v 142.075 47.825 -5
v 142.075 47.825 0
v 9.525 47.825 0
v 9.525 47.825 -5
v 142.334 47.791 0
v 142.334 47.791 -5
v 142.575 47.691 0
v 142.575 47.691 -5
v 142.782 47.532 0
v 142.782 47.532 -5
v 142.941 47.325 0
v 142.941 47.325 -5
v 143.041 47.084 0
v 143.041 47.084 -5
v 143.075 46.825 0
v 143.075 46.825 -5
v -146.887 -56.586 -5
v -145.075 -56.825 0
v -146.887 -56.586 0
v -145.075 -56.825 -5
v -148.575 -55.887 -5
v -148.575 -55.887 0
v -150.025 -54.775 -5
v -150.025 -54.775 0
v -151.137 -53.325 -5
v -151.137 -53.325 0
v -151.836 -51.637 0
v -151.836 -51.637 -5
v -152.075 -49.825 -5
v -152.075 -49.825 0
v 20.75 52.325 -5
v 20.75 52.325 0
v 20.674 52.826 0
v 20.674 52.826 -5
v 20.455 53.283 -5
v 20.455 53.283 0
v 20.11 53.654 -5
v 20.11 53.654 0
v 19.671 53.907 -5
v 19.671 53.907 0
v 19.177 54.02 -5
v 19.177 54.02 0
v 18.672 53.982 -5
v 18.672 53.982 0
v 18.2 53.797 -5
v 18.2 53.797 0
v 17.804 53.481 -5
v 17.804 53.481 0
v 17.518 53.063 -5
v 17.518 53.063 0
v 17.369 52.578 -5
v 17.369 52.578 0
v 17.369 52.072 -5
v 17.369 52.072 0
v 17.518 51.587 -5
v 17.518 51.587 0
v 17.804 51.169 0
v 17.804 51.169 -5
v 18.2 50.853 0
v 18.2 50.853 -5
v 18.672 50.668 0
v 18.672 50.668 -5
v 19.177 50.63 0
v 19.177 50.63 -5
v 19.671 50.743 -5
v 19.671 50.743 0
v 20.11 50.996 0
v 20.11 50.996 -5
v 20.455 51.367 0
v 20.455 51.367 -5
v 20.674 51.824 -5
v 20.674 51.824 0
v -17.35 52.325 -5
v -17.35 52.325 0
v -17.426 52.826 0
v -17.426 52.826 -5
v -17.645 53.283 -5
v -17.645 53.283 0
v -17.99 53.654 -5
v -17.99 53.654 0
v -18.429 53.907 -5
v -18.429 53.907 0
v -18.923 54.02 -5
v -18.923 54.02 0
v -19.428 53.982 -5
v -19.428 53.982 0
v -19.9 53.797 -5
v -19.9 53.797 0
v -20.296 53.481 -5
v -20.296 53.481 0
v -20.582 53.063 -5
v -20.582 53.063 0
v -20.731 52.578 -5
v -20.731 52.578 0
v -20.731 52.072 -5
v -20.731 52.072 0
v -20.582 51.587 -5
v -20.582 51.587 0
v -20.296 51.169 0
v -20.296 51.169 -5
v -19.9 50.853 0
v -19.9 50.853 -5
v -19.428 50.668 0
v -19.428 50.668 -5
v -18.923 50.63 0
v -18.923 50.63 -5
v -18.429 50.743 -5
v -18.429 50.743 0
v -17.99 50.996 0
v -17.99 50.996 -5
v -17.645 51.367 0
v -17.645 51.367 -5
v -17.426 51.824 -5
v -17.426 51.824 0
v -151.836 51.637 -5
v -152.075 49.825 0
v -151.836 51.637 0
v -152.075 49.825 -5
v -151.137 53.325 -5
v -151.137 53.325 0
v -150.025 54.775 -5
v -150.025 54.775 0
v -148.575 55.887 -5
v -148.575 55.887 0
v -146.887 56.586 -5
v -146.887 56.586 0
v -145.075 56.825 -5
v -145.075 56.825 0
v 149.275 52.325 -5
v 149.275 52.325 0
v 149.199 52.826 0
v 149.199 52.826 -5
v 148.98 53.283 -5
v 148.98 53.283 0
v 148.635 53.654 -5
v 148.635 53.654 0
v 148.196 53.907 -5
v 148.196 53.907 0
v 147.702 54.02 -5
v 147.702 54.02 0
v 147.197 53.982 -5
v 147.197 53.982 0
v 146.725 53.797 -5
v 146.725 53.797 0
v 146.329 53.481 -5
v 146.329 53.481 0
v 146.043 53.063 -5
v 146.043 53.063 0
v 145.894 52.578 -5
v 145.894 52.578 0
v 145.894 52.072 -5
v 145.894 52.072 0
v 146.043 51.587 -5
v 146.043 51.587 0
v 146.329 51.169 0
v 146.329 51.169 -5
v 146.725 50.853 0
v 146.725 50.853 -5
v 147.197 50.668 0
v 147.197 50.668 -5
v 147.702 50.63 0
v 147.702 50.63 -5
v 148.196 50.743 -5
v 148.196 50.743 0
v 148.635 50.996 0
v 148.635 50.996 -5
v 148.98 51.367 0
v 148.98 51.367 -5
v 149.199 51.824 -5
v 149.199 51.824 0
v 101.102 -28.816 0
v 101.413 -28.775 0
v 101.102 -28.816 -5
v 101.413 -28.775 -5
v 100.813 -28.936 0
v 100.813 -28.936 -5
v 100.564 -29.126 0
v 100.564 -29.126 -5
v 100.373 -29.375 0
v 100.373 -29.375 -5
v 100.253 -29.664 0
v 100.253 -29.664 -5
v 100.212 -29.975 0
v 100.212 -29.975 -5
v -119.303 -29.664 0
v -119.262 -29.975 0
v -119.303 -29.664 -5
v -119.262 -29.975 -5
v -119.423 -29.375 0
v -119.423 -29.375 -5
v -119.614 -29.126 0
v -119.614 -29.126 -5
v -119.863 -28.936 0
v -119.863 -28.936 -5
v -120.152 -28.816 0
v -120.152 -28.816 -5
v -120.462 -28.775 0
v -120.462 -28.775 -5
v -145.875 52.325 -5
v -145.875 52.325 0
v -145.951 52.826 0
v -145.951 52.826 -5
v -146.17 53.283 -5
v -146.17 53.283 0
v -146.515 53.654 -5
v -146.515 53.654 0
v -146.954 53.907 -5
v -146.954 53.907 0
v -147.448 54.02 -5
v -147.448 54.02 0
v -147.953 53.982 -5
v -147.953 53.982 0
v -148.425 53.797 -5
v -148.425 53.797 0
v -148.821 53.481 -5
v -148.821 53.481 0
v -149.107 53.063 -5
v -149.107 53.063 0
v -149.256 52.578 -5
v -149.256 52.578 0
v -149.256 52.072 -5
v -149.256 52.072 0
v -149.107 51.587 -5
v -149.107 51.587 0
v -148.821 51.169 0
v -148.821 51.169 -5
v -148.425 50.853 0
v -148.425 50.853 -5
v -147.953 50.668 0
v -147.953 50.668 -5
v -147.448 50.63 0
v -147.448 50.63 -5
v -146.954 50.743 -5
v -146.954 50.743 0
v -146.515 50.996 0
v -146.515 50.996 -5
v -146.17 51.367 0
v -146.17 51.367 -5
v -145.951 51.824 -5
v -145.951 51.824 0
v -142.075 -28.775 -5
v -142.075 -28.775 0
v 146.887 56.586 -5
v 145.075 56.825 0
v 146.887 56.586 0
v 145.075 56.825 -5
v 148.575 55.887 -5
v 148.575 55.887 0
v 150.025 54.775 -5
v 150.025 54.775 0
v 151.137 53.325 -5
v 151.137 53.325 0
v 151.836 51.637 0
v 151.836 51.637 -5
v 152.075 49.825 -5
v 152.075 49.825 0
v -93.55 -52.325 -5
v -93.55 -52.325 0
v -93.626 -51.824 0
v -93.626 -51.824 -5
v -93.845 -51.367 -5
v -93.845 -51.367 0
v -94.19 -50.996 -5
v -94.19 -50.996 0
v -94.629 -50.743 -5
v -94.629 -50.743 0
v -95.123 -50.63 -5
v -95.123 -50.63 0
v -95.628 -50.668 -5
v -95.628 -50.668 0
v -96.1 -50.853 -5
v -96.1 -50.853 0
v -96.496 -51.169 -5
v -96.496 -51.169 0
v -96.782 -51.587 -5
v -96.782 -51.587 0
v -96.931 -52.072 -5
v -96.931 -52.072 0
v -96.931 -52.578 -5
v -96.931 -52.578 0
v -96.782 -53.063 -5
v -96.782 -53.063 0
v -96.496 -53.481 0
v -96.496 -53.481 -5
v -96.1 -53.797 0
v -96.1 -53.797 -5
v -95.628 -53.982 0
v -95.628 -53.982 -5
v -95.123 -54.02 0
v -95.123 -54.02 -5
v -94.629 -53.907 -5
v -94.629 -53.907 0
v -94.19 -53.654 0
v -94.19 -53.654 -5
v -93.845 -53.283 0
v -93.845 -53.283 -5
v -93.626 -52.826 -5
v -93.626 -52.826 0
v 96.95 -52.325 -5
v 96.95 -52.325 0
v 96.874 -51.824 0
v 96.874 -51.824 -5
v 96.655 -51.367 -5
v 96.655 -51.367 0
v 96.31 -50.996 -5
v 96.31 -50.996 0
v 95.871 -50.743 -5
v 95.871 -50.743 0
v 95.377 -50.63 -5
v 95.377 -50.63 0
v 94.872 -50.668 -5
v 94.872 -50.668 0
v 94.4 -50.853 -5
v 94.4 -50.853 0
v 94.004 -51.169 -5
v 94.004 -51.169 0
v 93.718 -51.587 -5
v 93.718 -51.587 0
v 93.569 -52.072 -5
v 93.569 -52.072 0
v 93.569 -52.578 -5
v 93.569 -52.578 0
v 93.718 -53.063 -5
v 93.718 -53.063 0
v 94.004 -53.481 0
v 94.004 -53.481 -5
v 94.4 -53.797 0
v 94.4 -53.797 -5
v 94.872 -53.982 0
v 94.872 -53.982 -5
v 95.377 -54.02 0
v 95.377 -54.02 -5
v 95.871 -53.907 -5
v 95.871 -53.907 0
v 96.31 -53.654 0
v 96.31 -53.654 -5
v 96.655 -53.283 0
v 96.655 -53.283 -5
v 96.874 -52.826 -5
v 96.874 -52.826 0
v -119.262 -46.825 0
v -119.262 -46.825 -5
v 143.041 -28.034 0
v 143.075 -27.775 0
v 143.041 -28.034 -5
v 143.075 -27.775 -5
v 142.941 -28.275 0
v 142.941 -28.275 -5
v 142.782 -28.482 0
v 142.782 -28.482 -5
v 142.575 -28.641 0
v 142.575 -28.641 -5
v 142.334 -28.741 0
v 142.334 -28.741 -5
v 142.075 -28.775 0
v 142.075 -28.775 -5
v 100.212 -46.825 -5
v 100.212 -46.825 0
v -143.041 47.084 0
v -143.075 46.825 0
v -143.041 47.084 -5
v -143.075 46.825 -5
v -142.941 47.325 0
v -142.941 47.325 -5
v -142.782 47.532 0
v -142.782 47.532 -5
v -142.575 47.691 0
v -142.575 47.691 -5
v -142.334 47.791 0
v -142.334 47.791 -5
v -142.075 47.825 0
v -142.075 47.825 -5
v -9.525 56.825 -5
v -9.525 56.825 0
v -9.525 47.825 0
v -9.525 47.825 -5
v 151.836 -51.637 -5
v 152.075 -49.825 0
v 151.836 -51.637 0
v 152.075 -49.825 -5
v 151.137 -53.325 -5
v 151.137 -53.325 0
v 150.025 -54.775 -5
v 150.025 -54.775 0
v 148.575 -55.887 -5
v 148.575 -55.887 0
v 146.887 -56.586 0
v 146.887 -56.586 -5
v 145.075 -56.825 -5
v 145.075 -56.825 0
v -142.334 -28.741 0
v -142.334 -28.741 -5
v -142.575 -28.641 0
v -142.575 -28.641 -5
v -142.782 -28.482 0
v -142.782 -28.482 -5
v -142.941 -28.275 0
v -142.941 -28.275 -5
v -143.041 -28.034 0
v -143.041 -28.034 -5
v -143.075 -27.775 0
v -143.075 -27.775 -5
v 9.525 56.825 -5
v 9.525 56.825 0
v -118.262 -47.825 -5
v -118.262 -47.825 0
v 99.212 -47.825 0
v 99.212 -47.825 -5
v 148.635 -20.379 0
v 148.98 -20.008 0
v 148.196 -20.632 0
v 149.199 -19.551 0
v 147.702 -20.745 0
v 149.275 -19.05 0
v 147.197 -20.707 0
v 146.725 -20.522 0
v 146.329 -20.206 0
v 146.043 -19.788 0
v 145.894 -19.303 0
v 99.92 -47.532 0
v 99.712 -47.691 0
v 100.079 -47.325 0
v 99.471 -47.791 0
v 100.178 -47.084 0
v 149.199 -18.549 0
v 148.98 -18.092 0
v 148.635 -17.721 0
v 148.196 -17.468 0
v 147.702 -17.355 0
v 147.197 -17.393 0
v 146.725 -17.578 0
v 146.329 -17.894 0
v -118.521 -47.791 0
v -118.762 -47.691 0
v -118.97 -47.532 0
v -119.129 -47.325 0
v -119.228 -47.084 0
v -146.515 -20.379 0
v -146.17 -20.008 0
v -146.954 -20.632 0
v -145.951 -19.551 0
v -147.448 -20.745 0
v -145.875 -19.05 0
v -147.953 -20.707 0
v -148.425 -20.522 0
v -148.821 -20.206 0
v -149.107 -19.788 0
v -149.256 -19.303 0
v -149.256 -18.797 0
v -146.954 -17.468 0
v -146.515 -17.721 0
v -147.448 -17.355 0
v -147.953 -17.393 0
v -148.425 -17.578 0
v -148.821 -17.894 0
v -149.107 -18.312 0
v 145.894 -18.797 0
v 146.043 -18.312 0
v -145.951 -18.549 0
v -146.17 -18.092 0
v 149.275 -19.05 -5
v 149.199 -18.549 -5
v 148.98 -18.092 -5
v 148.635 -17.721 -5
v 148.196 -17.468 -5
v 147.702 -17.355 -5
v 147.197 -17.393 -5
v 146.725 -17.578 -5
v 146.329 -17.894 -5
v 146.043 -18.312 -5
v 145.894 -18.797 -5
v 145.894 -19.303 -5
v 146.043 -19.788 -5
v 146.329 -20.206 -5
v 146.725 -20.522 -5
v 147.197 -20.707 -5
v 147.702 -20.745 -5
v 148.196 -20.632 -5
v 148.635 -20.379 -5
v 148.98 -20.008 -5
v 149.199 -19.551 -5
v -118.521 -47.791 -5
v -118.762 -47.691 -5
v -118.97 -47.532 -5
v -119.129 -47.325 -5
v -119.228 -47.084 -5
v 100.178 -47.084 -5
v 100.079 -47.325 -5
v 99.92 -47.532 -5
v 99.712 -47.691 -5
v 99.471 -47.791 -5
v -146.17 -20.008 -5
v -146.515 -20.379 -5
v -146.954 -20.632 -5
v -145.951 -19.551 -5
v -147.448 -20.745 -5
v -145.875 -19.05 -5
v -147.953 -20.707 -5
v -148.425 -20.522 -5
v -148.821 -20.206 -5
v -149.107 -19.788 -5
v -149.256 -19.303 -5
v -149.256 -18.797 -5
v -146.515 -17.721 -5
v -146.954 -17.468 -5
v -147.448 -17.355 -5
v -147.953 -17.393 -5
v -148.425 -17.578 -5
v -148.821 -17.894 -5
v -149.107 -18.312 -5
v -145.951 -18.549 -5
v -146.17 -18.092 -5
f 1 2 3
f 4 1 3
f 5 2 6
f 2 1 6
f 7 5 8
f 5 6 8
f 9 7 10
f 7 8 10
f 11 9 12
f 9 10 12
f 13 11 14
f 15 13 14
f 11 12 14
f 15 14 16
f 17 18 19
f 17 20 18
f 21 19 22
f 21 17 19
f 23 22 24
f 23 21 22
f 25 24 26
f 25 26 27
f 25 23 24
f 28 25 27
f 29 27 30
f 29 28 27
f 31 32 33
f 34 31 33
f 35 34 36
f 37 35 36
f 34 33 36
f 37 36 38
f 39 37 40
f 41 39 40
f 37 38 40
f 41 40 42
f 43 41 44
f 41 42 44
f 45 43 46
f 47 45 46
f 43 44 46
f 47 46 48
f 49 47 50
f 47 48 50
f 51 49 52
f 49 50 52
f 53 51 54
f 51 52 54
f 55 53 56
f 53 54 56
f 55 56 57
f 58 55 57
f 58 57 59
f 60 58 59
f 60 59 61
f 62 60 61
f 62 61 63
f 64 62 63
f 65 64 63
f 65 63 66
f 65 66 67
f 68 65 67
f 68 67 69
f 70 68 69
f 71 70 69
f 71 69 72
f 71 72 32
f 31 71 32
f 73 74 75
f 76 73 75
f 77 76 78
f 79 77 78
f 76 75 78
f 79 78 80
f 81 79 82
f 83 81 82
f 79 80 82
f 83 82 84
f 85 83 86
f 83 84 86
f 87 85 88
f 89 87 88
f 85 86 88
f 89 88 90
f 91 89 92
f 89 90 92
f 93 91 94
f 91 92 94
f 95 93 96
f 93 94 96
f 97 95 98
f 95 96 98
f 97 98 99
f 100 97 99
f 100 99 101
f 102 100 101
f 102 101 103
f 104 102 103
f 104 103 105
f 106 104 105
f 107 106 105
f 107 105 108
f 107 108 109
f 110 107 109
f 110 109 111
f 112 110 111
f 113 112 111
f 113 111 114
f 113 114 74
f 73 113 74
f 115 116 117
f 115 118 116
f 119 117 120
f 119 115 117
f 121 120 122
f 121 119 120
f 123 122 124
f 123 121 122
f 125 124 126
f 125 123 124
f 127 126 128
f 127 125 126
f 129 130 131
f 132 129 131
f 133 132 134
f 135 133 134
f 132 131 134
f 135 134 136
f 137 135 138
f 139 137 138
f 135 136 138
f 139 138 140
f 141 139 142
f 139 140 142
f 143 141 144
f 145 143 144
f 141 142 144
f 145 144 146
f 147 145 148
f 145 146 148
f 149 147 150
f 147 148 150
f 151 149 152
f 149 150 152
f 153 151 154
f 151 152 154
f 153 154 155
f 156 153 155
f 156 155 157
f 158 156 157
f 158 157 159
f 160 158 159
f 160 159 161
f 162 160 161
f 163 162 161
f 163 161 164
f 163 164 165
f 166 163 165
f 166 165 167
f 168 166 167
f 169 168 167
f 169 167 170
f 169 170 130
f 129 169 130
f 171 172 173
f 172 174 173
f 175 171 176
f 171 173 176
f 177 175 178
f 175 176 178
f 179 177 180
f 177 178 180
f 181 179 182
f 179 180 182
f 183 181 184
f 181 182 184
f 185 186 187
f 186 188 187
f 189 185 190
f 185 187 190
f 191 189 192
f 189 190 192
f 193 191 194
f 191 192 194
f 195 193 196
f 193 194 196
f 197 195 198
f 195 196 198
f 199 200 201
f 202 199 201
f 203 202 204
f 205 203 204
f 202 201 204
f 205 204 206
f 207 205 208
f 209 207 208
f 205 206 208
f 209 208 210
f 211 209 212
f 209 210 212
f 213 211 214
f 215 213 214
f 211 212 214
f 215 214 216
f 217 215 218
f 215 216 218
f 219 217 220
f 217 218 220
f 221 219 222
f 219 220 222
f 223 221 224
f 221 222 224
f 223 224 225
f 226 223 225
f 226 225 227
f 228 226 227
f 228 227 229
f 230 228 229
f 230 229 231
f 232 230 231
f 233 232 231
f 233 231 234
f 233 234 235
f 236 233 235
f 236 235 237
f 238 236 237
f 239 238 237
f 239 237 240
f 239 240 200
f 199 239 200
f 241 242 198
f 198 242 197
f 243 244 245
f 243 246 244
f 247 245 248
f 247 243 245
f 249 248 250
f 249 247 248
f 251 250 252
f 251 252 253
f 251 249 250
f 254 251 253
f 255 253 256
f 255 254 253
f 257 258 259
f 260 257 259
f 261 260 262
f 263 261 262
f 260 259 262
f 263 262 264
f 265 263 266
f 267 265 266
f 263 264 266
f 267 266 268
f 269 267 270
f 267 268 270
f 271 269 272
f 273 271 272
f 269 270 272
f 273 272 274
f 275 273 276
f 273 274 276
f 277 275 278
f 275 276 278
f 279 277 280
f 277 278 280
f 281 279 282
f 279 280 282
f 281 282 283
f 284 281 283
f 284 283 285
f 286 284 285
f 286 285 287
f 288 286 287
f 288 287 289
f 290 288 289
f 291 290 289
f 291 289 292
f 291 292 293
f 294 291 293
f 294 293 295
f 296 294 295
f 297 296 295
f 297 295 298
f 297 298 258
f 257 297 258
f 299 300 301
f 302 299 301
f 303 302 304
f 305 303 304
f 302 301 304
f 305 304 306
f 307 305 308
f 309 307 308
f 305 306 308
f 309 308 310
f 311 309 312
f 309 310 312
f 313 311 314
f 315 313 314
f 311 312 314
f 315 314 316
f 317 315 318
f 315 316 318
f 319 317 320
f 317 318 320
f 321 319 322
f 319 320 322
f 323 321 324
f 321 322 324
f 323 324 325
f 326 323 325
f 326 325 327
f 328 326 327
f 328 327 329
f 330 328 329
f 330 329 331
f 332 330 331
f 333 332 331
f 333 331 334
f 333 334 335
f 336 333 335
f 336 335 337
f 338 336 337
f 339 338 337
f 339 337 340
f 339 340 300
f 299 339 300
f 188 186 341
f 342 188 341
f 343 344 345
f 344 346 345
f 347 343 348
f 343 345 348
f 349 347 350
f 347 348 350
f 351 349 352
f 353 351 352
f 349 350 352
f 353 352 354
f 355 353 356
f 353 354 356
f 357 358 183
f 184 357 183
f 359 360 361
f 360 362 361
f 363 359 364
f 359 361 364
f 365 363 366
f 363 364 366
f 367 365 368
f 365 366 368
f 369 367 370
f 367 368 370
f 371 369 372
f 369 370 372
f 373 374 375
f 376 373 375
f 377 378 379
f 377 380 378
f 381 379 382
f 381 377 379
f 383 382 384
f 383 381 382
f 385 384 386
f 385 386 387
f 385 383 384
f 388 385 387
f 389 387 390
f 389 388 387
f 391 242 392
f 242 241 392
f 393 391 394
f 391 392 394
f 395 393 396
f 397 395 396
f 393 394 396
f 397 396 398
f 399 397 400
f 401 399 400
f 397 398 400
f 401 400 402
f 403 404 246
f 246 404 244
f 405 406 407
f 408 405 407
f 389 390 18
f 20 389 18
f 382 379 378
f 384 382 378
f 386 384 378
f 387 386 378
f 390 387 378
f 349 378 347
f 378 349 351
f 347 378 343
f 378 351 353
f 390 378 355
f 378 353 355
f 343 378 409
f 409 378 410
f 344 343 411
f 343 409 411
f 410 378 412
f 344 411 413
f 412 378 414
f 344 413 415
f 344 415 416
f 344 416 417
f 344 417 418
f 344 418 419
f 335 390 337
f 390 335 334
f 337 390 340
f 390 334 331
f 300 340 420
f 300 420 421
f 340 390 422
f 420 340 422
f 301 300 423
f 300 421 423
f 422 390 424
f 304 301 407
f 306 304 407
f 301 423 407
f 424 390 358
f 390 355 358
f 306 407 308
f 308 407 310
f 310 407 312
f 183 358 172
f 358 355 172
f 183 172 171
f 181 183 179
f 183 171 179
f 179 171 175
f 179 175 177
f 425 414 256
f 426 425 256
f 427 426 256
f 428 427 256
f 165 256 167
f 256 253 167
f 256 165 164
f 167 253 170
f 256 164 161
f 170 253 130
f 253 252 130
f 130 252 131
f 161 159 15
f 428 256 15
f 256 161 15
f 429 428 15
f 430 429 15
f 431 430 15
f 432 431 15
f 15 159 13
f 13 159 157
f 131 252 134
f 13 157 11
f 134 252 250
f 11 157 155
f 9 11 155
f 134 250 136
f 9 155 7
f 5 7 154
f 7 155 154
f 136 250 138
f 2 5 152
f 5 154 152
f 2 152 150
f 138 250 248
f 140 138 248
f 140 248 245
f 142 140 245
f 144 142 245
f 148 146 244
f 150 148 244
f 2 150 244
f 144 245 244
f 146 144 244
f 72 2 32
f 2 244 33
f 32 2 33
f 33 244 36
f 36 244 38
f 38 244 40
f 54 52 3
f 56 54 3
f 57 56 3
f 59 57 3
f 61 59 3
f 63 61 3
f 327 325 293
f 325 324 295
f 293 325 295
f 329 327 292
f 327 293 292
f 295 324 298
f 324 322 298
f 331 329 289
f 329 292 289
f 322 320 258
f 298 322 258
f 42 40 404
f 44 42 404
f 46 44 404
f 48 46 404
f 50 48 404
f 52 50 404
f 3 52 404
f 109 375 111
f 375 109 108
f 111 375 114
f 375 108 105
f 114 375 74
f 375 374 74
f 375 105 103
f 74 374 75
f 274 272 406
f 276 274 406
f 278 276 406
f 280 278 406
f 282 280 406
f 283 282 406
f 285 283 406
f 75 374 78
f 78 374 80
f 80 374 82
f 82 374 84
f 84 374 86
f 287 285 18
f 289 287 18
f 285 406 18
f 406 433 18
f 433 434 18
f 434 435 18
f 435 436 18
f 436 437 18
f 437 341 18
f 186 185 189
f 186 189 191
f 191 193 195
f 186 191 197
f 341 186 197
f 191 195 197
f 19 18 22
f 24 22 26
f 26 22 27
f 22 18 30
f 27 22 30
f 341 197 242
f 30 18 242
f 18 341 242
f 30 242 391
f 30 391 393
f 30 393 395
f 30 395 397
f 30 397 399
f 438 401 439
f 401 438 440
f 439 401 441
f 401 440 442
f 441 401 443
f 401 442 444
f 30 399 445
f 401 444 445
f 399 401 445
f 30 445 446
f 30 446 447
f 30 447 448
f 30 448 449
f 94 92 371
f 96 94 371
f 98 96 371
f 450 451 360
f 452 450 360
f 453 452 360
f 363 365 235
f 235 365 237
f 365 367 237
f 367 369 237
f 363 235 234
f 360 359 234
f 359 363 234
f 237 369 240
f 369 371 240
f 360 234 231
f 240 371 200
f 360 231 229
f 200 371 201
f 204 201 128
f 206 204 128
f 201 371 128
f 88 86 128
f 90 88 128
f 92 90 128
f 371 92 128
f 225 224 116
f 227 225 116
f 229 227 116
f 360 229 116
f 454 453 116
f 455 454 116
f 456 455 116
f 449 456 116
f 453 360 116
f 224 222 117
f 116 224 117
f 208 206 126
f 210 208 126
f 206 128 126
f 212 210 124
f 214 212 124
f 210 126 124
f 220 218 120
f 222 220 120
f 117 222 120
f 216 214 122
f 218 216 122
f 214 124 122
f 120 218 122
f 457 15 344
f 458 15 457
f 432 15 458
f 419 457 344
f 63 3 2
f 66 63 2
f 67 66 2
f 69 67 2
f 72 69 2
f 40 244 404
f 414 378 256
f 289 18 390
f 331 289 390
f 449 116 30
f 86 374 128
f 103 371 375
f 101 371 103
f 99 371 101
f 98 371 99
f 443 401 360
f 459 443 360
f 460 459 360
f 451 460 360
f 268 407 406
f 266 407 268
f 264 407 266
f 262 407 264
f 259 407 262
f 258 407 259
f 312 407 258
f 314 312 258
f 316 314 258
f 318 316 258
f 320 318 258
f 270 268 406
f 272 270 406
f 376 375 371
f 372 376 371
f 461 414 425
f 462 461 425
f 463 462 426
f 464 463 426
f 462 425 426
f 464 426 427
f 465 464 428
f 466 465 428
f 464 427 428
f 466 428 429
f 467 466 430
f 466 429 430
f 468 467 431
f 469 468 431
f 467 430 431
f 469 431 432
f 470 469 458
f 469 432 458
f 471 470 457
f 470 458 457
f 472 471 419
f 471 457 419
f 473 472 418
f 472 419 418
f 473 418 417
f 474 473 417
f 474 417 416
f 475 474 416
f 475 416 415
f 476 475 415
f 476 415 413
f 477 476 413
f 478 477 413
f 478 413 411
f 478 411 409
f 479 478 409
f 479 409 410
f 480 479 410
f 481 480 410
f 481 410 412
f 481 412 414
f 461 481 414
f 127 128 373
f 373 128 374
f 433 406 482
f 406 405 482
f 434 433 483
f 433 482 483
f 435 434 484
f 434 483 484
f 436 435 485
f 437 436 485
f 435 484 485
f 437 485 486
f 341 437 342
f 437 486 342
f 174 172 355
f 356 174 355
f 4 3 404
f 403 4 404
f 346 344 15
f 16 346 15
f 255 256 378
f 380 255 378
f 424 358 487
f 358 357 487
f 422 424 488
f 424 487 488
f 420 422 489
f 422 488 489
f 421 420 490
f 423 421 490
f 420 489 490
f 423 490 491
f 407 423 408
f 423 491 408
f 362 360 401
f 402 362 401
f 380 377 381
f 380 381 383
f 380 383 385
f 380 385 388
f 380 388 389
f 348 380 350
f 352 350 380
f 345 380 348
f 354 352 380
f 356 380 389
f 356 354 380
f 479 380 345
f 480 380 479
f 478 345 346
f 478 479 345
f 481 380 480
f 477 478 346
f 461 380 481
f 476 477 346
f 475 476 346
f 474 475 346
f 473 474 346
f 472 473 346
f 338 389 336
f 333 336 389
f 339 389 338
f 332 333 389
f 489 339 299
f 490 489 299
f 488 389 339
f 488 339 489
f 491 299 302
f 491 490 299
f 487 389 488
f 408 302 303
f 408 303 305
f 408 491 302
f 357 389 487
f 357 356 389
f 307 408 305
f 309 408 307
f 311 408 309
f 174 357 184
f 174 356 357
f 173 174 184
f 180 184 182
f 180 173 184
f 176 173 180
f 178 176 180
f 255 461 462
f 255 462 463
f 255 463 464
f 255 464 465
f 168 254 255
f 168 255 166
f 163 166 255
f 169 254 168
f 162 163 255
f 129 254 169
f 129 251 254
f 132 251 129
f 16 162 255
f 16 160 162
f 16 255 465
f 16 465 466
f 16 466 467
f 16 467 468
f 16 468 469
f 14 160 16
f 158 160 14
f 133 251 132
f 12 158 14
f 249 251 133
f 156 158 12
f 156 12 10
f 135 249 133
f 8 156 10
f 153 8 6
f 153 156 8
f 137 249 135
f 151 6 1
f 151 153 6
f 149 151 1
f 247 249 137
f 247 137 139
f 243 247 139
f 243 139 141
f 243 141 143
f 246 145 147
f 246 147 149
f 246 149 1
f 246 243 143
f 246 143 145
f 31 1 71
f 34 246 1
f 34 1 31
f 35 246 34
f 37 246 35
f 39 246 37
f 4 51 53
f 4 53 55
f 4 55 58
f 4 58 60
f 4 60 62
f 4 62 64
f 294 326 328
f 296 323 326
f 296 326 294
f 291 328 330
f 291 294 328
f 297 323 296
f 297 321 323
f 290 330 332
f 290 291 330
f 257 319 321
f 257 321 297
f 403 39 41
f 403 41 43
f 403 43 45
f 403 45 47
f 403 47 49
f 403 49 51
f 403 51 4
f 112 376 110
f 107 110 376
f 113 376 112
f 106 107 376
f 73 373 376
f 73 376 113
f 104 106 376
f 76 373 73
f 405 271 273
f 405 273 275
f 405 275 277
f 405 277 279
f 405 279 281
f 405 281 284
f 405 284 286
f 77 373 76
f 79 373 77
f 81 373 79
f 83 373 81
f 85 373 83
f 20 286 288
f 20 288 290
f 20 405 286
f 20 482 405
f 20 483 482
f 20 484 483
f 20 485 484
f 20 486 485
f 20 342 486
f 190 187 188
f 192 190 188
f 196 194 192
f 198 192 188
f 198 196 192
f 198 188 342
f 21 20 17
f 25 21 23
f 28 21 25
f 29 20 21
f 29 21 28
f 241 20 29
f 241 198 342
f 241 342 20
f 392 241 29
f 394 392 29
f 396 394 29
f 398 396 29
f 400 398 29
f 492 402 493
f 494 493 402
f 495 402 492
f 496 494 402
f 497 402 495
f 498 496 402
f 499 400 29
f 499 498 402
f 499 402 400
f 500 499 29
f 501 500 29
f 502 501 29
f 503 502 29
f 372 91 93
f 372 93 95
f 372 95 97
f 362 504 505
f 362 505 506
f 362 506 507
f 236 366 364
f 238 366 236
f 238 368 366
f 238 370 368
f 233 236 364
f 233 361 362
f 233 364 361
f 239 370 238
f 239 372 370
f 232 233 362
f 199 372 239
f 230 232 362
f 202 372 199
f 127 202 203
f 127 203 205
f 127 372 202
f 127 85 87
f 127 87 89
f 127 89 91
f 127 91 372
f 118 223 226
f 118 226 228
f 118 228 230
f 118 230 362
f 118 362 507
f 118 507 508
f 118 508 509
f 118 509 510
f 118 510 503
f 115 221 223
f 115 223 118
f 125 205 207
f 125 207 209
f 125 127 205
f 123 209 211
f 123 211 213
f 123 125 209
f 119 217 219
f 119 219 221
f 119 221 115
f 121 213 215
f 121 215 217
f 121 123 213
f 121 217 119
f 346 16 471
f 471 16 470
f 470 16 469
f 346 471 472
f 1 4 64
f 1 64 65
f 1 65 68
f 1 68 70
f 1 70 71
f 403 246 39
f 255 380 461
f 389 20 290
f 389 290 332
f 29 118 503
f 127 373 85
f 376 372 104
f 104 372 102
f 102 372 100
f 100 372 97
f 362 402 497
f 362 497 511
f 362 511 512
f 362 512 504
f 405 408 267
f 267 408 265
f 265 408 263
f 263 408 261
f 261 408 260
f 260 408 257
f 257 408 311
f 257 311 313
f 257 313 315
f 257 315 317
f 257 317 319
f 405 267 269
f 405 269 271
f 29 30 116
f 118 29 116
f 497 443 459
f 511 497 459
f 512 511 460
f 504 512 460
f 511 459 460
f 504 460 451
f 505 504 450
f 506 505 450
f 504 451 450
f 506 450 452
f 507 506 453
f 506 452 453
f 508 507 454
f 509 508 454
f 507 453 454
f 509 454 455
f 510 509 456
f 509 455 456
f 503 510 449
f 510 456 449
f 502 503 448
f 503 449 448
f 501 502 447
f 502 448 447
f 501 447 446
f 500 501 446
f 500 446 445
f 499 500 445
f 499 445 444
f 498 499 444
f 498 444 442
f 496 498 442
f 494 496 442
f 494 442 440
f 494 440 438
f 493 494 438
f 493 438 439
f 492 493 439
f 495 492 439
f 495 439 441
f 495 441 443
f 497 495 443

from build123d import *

# Parameters (mm, degrees)
PAD001_DEPTH  = 5
FILLET004_R   = 7
FILLET005_R   = 1
FILLET006_R   = 1.2
SKETCH014_R   = 1.7
HOLE003_DEPTH = 25


with BuildPart() as part:
    # Sketch001 → Pad001 (new body)
    with BuildSketch(Plane.XY):
        Polygon((-9.525, 56.825), (-9.525, 47.825), (-143.075, 47.825), (-143.075, -28.775), (-119.2625, -28.775), (-119.2625, -47.825), (100.2125, -47.825), (100.2125, -28.775), (143.075, -28.775), (143.075, 47.825), (9.525, 47.825), (9.525, 56.825), (152.075, 56.825), (152.075, -56.825), (-152.075, -56.825), (-152.075, 56.825), align=None)
    extrude(amount=-PAD001_DEPTH)

    # Fillet004
    fillet004_edges = [part.edges().sort_by_distance(p)[0] for p in [
        (-152.075, 56.825, -2.5),
        (-152.075, -56.825, -2.5),
        (152.075, 56.825, -2.5),
        (152.075, -56.825, -2.5),
    ]]
    fillet(fillet004_edges, radius=FILLET004_R)

    # Fillet005
    fillet005_edges = [part.edges().sort_by_distance(p)[0] for p in [
        (-143.075, 47.825, -2.5),
        (-143.075, -28.775, -2.5),
        (-119.2625, -47.825, -2.5),
        (100.2125, -47.825, -2.5),
        (143.075, -28.775, -2.5),
        (143.075, 47.825, -2.5),
    ]]
    fillet(fillet005_edges, radius=FILLET005_R)

    # Fillet006
    fillet006_edges = [part.edges().sort_by_distance(p)[0] for p in [
        (100.2125, -28.775, -2.5),
        (-119.2625, -28.775, -2.5),
    ]]
    fillet(fillet006_edges, radius=FILLET006_R)

    # Sketch014 (on Face1 of Fillet006) → Hole003 (cut)
    with BuildSketch(Plane.XY):
        with Locations((147.575, 52.325)):
            Circle(SKETCH014_R)
        with Locations((147.575, -19.05)):
            Circle(SKETCH014_R)
        with Locations((95.25, -52.325)):
            Circle(SKETCH014_R)
        with Locations((-95.25, -52.325)):
            Circle(SKETCH014_R)
        with Locations((-147.575, -19.05)):
            Circle(SKETCH014_R)
        with Locations((-147.575, 52.325)):
            Circle(SKETCH014_R)
        with Locations((-19.05, 52.325)):
            Circle(SKETCH014_R)
        with Locations((19.05, 52.325)):
            Circle(SKETCH014_R)
    extrude(amount=-HOLE003_DEPTH, mode=Mode.SUBTRACT)


solid = part.part
